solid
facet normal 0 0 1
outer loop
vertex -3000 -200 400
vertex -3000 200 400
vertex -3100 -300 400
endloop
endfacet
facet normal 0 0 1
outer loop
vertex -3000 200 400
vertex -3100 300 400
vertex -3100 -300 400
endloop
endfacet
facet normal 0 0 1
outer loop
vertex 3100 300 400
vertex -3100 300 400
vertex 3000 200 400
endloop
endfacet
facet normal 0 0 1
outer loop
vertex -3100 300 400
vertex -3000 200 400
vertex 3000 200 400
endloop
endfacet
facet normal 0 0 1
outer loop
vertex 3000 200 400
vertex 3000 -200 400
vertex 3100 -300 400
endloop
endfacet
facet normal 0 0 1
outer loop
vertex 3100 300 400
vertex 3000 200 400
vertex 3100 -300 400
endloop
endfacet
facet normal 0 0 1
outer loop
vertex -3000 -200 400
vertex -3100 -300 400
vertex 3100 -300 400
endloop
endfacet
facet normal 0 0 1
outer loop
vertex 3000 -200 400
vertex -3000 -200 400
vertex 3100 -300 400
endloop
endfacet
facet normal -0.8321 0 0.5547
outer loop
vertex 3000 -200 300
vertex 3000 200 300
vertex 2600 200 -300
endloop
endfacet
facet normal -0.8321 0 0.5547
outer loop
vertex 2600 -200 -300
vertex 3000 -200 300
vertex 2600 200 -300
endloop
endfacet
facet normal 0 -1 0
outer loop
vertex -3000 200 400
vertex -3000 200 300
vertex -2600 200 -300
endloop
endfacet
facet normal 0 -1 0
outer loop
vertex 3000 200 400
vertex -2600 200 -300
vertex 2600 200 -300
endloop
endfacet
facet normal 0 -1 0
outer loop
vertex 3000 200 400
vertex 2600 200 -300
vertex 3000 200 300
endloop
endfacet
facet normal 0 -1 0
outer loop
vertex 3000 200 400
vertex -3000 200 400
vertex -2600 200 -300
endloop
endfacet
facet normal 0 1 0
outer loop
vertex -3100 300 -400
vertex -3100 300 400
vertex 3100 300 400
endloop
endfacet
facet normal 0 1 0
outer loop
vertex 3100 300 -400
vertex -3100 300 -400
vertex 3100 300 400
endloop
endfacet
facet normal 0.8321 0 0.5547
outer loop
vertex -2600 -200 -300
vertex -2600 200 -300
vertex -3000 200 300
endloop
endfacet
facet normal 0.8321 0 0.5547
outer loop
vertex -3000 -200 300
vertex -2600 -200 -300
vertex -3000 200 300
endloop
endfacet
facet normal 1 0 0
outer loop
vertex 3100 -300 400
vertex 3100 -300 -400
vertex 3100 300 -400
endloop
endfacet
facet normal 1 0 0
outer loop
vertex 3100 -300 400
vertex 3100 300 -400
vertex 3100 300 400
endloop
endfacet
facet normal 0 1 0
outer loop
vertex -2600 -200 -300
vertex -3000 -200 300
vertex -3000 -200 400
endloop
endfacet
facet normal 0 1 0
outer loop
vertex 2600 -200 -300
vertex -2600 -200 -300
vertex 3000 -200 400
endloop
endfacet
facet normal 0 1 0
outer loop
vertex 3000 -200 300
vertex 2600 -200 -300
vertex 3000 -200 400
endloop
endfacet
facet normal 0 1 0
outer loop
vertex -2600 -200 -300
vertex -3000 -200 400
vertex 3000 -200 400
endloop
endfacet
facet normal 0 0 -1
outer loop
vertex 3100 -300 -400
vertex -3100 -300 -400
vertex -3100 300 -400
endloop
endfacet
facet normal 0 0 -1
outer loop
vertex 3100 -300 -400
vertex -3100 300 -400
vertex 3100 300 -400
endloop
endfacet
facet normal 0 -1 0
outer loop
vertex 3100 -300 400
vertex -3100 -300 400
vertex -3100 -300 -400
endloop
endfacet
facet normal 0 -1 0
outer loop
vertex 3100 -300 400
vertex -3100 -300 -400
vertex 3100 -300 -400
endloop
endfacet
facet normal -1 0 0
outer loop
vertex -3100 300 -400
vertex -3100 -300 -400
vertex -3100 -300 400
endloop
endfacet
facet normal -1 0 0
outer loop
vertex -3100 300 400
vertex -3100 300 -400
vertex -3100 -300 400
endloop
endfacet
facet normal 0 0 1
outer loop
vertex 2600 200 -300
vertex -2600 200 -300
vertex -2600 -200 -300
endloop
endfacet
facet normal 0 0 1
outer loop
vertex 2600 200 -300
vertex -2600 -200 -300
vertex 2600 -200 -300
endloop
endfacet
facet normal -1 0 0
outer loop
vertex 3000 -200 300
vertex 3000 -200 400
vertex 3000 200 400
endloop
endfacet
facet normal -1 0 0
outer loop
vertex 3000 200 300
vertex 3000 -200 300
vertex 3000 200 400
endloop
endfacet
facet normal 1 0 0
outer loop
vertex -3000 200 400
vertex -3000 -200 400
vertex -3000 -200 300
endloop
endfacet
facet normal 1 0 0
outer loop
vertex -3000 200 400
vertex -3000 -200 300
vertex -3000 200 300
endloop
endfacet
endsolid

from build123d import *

# Parameters (mm, degrees)
F0_W     = 6200
F0_H     = 800
F1_DEPTH = 300
F2_W     = 6000
F2_H     = 400
F3_DEPTH = 700
F5_DEPTH = 400
F7_DEPTH = 400


with BuildPart() as f1:
    # F0 (on Front) → F1 (new body, symmetric)
    with BuildSketch(Plane.XZ):
        Rectangle(F0_W, F0_H)
    extrude(amount=F1_DEPTH, both=True)

    # F2 (on face) → F3 (cut)
    with BuildSketch(Plane.XY.offset(400)):
        Rectangle(F2_W, F2_H)
    extrude(amount=-F3_DEPTH, mode=Mode.SUBTRACT)

    # F4 (on face) → F5 (join, through all)
    with BuildSketch(Plane.XZ.offset(-200)):
        Polygon((-2600, -300), (-3000, 300), (-3000, -300), align=None)
    extrude(amount=F5_DEPTH)

    # F6 (on face) → F7 (join, through all)
    with BuildSketch(Plane.XZ.offset(-200)):
        Polygon((3000, 300), (2600, -300), (3000, -300), align=None)
    extrude(amount=F7_DEPTH)


solid = f1.part
